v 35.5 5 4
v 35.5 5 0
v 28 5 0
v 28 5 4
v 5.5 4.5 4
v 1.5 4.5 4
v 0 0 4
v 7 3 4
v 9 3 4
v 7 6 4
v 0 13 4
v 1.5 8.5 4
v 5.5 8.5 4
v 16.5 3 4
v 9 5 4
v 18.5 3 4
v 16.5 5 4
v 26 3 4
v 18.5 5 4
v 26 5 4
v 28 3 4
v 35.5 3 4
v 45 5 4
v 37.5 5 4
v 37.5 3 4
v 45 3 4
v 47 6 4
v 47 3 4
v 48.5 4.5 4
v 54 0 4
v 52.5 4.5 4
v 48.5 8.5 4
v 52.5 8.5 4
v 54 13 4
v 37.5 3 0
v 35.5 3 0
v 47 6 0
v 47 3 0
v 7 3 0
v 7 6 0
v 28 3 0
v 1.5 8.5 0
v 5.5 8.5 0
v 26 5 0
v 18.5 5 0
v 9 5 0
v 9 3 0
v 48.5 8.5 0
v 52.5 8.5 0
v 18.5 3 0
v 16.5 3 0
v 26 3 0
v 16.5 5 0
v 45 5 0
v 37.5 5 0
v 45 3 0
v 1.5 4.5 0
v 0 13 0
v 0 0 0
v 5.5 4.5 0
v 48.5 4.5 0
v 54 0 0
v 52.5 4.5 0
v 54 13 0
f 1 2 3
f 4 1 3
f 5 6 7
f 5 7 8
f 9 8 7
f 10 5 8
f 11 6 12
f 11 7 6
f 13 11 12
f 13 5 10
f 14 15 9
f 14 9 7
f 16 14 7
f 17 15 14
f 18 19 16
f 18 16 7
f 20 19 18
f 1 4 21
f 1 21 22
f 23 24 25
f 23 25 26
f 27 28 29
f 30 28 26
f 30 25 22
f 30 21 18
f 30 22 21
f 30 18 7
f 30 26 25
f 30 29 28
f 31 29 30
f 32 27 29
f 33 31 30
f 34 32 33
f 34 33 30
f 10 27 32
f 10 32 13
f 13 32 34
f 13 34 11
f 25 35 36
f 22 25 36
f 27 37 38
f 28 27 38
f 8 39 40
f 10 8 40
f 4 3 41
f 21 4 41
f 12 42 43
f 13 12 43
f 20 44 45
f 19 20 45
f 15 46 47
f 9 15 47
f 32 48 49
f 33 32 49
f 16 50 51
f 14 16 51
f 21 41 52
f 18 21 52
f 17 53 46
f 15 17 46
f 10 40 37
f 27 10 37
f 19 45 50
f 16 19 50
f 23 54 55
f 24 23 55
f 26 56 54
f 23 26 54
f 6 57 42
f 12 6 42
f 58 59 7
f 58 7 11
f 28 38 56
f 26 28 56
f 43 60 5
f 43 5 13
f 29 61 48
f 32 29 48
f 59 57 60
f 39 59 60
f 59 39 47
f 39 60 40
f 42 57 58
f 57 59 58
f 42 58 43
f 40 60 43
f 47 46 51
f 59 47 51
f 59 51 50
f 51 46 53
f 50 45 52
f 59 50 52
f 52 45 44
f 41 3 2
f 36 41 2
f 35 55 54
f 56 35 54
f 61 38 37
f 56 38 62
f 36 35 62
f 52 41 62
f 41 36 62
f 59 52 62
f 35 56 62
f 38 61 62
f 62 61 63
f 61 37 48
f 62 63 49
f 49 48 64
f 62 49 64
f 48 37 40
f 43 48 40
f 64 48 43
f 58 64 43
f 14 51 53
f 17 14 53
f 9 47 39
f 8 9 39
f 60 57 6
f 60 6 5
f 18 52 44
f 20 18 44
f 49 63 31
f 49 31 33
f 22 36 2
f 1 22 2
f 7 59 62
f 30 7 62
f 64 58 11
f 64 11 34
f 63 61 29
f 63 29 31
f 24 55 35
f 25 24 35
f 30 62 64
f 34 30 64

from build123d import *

# Parameters (mm, degrees)
SKETCH1_W           = 54
SKETCH1_H           = 13
SKETCH1_W_2         = 4
SKETCH1_H_2         = 4
BOSS_EXTRUDE1_DEPTH = 4


with BuildPart() as part:
    # Sketch1 → Boss-Extrude1 (new body)
    with BuildSketch(Plane.XY):
        with Locations((27, 6.5)):
            Rectangle(SKETCH1_W, SKETCH1_H)
        Polygon((7, 3), (7, 6), (47, 6), (47, 3), (45, 3), (45, 5), (37.5, 5), (37.5, 3), (35.5, 3), (35.5, 5), (28, 5), (28, 3), (26, 3), (26, 5), (18.5, 5), (18.5, 3), (16.5, 3), (16.5, 5), (9, 5), (9, 3), align=None, mode=Mode.SUBTRACT)
        with Locations((50.5, 6.5)):
            Rectangle(SKETCH1_W_2, SKETCH1_H_2, mode=Mode.SUBTRACT)
        with Locations((3.5, 6.5)):
            Rectangle(SKETCH1_W_2, SKETCH1_H_2, mode=Mode.SUBTRACT)
    extrude(amount=BOSS_EXTRUDE1_DEPTH)


solid = part.part
